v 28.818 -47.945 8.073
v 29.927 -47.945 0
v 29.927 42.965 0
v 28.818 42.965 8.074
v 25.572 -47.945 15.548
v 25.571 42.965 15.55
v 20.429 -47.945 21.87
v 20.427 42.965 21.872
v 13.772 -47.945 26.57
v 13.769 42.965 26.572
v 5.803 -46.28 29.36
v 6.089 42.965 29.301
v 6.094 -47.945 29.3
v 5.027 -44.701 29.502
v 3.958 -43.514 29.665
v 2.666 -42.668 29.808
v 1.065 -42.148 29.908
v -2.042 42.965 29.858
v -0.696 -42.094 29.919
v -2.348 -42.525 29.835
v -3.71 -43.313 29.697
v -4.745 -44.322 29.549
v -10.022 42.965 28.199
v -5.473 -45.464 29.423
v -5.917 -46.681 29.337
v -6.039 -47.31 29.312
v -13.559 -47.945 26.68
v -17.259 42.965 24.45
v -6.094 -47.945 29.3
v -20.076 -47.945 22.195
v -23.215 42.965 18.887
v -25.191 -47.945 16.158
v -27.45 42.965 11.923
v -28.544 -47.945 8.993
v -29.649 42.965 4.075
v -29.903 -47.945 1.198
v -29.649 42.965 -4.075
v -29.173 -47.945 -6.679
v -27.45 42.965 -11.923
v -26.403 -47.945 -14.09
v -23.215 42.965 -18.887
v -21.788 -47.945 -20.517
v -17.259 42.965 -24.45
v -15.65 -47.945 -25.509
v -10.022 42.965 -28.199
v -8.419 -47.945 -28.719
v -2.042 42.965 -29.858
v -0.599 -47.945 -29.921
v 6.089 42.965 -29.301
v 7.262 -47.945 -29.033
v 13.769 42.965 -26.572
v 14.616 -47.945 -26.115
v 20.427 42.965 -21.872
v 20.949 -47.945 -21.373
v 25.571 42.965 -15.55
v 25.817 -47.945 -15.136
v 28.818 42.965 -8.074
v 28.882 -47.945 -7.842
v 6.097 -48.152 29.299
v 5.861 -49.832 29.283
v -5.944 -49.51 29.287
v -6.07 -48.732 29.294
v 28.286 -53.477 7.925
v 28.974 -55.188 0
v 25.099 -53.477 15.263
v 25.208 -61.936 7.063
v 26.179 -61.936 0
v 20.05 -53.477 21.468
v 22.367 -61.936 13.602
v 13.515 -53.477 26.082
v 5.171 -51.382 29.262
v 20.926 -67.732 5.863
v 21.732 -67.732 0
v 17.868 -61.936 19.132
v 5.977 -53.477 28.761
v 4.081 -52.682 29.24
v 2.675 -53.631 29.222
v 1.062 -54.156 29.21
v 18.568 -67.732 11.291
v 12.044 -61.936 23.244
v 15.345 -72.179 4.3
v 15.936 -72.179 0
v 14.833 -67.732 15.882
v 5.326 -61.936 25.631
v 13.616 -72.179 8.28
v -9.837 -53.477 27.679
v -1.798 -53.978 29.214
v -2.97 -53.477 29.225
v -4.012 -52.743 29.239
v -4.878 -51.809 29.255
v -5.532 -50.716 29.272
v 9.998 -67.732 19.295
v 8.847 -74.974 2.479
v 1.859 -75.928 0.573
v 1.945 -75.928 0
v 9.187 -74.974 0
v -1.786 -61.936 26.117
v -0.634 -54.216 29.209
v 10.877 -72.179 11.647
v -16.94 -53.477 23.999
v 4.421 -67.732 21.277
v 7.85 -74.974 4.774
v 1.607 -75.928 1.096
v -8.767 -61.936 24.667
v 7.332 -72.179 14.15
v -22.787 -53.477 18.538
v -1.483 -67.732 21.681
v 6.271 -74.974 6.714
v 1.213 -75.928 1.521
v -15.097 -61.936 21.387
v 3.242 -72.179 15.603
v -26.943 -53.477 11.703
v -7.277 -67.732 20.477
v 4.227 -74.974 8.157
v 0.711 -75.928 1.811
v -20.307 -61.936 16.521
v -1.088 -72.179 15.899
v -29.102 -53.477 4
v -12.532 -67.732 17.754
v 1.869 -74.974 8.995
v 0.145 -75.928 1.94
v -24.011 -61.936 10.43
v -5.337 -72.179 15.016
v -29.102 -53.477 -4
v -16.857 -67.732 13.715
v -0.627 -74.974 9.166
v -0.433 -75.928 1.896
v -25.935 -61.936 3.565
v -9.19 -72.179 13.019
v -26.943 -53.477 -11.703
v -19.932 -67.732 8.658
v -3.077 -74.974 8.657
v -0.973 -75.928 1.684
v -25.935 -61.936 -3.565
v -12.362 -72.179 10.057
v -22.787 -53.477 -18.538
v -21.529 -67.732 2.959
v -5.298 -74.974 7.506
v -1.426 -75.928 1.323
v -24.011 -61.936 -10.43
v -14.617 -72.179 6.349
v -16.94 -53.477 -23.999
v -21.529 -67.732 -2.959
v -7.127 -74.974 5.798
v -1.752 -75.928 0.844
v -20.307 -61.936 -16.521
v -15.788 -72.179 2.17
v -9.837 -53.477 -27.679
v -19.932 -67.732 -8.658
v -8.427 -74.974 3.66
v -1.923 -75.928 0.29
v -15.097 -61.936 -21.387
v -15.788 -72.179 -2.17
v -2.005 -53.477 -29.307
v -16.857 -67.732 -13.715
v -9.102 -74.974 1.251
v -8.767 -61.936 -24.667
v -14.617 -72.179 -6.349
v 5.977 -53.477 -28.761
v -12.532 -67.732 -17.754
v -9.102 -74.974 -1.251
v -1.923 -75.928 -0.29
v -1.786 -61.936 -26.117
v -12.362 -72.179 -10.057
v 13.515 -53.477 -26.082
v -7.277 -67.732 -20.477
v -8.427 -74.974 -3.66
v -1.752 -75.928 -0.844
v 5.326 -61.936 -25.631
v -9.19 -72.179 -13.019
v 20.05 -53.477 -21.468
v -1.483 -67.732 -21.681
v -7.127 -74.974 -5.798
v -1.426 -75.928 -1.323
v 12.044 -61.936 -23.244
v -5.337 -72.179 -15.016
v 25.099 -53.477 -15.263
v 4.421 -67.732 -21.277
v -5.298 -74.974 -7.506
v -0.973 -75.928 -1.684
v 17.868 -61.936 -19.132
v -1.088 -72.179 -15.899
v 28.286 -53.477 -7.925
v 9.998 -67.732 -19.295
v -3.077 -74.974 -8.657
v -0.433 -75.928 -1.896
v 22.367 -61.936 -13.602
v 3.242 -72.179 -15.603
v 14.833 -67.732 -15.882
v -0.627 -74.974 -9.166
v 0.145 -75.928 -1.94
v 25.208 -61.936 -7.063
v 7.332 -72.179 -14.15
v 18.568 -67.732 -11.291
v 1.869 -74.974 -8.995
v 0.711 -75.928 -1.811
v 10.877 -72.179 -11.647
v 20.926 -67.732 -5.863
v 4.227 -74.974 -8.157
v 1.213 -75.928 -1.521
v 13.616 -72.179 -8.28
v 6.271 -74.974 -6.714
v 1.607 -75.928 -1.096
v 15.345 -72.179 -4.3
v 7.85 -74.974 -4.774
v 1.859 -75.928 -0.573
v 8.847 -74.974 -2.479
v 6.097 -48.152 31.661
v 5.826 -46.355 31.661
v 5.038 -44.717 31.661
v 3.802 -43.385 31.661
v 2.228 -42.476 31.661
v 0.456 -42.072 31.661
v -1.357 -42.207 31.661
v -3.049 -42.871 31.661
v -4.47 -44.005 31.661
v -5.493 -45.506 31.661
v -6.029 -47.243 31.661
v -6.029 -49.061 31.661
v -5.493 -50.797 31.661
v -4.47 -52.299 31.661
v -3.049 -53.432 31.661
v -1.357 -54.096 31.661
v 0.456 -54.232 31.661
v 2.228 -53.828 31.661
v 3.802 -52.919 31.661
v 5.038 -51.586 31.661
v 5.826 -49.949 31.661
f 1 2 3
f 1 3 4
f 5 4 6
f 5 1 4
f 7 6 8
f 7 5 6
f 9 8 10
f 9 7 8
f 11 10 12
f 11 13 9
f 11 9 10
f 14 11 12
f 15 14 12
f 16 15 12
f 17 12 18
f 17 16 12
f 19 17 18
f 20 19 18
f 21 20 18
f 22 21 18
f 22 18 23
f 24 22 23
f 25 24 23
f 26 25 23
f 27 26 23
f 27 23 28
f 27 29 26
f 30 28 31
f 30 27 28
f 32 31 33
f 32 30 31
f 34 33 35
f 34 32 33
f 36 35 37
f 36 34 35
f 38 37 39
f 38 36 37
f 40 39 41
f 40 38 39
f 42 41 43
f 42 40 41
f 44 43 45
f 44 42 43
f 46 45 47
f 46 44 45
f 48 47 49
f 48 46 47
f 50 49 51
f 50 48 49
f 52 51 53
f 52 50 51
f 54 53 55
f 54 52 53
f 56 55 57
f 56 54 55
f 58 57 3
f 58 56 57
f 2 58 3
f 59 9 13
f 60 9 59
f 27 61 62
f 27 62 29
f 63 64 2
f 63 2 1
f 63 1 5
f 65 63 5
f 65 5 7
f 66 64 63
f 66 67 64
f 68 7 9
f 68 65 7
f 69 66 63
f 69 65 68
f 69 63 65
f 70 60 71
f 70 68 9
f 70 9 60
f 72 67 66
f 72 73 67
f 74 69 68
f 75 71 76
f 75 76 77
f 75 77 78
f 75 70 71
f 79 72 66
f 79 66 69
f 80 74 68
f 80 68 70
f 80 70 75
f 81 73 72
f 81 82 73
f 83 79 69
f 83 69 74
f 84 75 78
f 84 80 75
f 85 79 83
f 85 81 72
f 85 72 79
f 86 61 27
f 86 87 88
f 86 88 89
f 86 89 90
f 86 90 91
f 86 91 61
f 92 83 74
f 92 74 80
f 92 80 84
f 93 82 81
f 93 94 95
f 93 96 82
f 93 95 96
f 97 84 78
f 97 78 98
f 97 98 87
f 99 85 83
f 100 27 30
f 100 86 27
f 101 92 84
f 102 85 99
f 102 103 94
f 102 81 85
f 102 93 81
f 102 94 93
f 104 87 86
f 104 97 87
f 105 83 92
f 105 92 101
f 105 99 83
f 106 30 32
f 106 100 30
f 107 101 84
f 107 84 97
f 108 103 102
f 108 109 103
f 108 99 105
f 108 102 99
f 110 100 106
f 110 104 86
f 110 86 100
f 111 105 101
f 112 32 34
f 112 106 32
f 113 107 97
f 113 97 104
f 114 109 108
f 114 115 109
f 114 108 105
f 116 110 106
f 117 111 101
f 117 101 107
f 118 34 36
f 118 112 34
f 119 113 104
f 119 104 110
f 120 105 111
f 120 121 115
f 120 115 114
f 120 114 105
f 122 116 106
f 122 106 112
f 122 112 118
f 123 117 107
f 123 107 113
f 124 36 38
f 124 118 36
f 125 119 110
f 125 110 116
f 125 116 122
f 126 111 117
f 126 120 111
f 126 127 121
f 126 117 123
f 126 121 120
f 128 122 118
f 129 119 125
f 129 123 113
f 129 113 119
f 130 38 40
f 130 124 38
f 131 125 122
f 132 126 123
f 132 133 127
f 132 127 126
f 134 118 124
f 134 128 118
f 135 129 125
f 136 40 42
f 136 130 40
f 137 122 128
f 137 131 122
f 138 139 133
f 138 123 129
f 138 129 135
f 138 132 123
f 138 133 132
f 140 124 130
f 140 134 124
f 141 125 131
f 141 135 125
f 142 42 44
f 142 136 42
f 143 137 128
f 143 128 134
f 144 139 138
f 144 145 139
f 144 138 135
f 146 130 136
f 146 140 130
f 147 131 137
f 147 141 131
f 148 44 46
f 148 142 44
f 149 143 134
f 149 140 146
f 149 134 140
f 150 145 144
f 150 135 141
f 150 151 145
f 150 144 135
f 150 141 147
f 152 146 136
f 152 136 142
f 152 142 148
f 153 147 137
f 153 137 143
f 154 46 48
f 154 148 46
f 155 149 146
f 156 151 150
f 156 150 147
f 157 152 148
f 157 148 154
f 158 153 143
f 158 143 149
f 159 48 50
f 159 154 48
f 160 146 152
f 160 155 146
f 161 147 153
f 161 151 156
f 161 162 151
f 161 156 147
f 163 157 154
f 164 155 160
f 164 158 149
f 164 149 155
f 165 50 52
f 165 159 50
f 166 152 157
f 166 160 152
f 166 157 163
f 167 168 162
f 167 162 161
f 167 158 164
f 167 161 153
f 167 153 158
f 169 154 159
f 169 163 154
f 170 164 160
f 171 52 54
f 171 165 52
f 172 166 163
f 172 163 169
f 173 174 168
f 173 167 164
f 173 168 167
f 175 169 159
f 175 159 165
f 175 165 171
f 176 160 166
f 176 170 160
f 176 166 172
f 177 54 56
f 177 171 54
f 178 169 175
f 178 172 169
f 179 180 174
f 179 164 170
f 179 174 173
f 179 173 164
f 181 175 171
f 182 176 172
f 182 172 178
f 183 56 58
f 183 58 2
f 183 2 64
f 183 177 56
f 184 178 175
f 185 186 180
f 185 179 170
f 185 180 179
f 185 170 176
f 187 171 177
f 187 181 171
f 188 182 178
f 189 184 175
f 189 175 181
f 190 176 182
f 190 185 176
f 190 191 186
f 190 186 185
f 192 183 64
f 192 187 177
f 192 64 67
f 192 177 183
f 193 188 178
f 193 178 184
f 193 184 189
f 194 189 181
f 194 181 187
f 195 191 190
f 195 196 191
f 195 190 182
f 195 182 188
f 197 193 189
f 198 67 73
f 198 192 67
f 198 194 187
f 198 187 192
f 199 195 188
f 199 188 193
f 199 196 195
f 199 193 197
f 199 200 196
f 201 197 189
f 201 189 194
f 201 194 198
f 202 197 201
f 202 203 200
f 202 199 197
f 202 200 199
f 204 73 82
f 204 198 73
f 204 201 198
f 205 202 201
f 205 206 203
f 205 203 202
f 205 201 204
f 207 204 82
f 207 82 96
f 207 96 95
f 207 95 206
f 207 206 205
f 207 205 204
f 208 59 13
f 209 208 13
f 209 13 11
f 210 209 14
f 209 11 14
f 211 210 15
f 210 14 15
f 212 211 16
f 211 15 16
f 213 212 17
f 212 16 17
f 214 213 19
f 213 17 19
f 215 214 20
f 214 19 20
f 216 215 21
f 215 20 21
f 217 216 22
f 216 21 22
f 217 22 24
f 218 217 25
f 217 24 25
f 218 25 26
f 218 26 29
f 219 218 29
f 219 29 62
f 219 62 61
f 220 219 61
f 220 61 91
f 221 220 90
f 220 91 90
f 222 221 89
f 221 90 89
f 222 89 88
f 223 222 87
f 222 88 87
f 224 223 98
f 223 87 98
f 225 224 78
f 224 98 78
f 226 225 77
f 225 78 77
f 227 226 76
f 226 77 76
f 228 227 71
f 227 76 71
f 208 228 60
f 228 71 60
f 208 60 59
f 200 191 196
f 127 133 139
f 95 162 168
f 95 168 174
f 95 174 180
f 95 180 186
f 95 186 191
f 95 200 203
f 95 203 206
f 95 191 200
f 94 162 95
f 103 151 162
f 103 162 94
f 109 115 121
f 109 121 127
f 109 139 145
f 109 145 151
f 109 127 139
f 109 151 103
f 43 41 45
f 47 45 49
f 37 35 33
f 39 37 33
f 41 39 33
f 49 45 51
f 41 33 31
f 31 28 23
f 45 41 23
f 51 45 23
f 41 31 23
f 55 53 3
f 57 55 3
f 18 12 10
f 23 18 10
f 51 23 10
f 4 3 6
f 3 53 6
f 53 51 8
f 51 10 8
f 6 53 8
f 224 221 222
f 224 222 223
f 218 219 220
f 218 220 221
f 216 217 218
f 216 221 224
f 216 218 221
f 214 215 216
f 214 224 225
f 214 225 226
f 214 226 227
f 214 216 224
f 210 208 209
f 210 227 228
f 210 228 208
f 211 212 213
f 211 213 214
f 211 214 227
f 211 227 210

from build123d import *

# Parameters (mm, degrees)
F0_R     = 29.9274598154
F1_DEPTH = 75.92757
F2_R     = 27.9824251374
F3_DEPTH = 42.964930072
F4_R     = 6.0972524399
F5_DEPTH = 31.6609
F6_DEPTH = 6.63492


# Not quite as in the source:
# - a feature names something its author has since deleted; it is built from what else it names


with BuildPart() as f1:
    # F0 (on Front) → F1 (new body)
    with BuildSketch(Plane.XZ):
        Circle(F0_R)
    extrude(amount=F1_DEPTH)

    # F2
    f2_edges = [f1.edges().sort_by_distance(p)[0] for p in [
        (-29.92746, -75.92757, 0),
    ]]
    fillet(f2_edges, radius=F2_R)

    # F3 (add): a face of the model
    f3_faces = [f1.faces().sort_by_distance(p)[0] for p in [
        (0, 0, 0),
    ]]
    extrude(f3_faces, amount=F3_DEPTH)

    # F4 (on Top) → F5 (join)
    with BuildSketch(Plane.XY):
        with Locations((0, -48.1517650187)):
            Circle(F4_R)
    extrude(amount=F5_DEPTH)

    # F6 (add): a face of the model
    f6_faces = [f1.faces().sort_by_distance(p)[0] for p in [
        (0, -48.1517650187, 31.6609),
    ]]
    extrude(f6_faces, amount=-F6_DEPTH)


solid = f1.part
